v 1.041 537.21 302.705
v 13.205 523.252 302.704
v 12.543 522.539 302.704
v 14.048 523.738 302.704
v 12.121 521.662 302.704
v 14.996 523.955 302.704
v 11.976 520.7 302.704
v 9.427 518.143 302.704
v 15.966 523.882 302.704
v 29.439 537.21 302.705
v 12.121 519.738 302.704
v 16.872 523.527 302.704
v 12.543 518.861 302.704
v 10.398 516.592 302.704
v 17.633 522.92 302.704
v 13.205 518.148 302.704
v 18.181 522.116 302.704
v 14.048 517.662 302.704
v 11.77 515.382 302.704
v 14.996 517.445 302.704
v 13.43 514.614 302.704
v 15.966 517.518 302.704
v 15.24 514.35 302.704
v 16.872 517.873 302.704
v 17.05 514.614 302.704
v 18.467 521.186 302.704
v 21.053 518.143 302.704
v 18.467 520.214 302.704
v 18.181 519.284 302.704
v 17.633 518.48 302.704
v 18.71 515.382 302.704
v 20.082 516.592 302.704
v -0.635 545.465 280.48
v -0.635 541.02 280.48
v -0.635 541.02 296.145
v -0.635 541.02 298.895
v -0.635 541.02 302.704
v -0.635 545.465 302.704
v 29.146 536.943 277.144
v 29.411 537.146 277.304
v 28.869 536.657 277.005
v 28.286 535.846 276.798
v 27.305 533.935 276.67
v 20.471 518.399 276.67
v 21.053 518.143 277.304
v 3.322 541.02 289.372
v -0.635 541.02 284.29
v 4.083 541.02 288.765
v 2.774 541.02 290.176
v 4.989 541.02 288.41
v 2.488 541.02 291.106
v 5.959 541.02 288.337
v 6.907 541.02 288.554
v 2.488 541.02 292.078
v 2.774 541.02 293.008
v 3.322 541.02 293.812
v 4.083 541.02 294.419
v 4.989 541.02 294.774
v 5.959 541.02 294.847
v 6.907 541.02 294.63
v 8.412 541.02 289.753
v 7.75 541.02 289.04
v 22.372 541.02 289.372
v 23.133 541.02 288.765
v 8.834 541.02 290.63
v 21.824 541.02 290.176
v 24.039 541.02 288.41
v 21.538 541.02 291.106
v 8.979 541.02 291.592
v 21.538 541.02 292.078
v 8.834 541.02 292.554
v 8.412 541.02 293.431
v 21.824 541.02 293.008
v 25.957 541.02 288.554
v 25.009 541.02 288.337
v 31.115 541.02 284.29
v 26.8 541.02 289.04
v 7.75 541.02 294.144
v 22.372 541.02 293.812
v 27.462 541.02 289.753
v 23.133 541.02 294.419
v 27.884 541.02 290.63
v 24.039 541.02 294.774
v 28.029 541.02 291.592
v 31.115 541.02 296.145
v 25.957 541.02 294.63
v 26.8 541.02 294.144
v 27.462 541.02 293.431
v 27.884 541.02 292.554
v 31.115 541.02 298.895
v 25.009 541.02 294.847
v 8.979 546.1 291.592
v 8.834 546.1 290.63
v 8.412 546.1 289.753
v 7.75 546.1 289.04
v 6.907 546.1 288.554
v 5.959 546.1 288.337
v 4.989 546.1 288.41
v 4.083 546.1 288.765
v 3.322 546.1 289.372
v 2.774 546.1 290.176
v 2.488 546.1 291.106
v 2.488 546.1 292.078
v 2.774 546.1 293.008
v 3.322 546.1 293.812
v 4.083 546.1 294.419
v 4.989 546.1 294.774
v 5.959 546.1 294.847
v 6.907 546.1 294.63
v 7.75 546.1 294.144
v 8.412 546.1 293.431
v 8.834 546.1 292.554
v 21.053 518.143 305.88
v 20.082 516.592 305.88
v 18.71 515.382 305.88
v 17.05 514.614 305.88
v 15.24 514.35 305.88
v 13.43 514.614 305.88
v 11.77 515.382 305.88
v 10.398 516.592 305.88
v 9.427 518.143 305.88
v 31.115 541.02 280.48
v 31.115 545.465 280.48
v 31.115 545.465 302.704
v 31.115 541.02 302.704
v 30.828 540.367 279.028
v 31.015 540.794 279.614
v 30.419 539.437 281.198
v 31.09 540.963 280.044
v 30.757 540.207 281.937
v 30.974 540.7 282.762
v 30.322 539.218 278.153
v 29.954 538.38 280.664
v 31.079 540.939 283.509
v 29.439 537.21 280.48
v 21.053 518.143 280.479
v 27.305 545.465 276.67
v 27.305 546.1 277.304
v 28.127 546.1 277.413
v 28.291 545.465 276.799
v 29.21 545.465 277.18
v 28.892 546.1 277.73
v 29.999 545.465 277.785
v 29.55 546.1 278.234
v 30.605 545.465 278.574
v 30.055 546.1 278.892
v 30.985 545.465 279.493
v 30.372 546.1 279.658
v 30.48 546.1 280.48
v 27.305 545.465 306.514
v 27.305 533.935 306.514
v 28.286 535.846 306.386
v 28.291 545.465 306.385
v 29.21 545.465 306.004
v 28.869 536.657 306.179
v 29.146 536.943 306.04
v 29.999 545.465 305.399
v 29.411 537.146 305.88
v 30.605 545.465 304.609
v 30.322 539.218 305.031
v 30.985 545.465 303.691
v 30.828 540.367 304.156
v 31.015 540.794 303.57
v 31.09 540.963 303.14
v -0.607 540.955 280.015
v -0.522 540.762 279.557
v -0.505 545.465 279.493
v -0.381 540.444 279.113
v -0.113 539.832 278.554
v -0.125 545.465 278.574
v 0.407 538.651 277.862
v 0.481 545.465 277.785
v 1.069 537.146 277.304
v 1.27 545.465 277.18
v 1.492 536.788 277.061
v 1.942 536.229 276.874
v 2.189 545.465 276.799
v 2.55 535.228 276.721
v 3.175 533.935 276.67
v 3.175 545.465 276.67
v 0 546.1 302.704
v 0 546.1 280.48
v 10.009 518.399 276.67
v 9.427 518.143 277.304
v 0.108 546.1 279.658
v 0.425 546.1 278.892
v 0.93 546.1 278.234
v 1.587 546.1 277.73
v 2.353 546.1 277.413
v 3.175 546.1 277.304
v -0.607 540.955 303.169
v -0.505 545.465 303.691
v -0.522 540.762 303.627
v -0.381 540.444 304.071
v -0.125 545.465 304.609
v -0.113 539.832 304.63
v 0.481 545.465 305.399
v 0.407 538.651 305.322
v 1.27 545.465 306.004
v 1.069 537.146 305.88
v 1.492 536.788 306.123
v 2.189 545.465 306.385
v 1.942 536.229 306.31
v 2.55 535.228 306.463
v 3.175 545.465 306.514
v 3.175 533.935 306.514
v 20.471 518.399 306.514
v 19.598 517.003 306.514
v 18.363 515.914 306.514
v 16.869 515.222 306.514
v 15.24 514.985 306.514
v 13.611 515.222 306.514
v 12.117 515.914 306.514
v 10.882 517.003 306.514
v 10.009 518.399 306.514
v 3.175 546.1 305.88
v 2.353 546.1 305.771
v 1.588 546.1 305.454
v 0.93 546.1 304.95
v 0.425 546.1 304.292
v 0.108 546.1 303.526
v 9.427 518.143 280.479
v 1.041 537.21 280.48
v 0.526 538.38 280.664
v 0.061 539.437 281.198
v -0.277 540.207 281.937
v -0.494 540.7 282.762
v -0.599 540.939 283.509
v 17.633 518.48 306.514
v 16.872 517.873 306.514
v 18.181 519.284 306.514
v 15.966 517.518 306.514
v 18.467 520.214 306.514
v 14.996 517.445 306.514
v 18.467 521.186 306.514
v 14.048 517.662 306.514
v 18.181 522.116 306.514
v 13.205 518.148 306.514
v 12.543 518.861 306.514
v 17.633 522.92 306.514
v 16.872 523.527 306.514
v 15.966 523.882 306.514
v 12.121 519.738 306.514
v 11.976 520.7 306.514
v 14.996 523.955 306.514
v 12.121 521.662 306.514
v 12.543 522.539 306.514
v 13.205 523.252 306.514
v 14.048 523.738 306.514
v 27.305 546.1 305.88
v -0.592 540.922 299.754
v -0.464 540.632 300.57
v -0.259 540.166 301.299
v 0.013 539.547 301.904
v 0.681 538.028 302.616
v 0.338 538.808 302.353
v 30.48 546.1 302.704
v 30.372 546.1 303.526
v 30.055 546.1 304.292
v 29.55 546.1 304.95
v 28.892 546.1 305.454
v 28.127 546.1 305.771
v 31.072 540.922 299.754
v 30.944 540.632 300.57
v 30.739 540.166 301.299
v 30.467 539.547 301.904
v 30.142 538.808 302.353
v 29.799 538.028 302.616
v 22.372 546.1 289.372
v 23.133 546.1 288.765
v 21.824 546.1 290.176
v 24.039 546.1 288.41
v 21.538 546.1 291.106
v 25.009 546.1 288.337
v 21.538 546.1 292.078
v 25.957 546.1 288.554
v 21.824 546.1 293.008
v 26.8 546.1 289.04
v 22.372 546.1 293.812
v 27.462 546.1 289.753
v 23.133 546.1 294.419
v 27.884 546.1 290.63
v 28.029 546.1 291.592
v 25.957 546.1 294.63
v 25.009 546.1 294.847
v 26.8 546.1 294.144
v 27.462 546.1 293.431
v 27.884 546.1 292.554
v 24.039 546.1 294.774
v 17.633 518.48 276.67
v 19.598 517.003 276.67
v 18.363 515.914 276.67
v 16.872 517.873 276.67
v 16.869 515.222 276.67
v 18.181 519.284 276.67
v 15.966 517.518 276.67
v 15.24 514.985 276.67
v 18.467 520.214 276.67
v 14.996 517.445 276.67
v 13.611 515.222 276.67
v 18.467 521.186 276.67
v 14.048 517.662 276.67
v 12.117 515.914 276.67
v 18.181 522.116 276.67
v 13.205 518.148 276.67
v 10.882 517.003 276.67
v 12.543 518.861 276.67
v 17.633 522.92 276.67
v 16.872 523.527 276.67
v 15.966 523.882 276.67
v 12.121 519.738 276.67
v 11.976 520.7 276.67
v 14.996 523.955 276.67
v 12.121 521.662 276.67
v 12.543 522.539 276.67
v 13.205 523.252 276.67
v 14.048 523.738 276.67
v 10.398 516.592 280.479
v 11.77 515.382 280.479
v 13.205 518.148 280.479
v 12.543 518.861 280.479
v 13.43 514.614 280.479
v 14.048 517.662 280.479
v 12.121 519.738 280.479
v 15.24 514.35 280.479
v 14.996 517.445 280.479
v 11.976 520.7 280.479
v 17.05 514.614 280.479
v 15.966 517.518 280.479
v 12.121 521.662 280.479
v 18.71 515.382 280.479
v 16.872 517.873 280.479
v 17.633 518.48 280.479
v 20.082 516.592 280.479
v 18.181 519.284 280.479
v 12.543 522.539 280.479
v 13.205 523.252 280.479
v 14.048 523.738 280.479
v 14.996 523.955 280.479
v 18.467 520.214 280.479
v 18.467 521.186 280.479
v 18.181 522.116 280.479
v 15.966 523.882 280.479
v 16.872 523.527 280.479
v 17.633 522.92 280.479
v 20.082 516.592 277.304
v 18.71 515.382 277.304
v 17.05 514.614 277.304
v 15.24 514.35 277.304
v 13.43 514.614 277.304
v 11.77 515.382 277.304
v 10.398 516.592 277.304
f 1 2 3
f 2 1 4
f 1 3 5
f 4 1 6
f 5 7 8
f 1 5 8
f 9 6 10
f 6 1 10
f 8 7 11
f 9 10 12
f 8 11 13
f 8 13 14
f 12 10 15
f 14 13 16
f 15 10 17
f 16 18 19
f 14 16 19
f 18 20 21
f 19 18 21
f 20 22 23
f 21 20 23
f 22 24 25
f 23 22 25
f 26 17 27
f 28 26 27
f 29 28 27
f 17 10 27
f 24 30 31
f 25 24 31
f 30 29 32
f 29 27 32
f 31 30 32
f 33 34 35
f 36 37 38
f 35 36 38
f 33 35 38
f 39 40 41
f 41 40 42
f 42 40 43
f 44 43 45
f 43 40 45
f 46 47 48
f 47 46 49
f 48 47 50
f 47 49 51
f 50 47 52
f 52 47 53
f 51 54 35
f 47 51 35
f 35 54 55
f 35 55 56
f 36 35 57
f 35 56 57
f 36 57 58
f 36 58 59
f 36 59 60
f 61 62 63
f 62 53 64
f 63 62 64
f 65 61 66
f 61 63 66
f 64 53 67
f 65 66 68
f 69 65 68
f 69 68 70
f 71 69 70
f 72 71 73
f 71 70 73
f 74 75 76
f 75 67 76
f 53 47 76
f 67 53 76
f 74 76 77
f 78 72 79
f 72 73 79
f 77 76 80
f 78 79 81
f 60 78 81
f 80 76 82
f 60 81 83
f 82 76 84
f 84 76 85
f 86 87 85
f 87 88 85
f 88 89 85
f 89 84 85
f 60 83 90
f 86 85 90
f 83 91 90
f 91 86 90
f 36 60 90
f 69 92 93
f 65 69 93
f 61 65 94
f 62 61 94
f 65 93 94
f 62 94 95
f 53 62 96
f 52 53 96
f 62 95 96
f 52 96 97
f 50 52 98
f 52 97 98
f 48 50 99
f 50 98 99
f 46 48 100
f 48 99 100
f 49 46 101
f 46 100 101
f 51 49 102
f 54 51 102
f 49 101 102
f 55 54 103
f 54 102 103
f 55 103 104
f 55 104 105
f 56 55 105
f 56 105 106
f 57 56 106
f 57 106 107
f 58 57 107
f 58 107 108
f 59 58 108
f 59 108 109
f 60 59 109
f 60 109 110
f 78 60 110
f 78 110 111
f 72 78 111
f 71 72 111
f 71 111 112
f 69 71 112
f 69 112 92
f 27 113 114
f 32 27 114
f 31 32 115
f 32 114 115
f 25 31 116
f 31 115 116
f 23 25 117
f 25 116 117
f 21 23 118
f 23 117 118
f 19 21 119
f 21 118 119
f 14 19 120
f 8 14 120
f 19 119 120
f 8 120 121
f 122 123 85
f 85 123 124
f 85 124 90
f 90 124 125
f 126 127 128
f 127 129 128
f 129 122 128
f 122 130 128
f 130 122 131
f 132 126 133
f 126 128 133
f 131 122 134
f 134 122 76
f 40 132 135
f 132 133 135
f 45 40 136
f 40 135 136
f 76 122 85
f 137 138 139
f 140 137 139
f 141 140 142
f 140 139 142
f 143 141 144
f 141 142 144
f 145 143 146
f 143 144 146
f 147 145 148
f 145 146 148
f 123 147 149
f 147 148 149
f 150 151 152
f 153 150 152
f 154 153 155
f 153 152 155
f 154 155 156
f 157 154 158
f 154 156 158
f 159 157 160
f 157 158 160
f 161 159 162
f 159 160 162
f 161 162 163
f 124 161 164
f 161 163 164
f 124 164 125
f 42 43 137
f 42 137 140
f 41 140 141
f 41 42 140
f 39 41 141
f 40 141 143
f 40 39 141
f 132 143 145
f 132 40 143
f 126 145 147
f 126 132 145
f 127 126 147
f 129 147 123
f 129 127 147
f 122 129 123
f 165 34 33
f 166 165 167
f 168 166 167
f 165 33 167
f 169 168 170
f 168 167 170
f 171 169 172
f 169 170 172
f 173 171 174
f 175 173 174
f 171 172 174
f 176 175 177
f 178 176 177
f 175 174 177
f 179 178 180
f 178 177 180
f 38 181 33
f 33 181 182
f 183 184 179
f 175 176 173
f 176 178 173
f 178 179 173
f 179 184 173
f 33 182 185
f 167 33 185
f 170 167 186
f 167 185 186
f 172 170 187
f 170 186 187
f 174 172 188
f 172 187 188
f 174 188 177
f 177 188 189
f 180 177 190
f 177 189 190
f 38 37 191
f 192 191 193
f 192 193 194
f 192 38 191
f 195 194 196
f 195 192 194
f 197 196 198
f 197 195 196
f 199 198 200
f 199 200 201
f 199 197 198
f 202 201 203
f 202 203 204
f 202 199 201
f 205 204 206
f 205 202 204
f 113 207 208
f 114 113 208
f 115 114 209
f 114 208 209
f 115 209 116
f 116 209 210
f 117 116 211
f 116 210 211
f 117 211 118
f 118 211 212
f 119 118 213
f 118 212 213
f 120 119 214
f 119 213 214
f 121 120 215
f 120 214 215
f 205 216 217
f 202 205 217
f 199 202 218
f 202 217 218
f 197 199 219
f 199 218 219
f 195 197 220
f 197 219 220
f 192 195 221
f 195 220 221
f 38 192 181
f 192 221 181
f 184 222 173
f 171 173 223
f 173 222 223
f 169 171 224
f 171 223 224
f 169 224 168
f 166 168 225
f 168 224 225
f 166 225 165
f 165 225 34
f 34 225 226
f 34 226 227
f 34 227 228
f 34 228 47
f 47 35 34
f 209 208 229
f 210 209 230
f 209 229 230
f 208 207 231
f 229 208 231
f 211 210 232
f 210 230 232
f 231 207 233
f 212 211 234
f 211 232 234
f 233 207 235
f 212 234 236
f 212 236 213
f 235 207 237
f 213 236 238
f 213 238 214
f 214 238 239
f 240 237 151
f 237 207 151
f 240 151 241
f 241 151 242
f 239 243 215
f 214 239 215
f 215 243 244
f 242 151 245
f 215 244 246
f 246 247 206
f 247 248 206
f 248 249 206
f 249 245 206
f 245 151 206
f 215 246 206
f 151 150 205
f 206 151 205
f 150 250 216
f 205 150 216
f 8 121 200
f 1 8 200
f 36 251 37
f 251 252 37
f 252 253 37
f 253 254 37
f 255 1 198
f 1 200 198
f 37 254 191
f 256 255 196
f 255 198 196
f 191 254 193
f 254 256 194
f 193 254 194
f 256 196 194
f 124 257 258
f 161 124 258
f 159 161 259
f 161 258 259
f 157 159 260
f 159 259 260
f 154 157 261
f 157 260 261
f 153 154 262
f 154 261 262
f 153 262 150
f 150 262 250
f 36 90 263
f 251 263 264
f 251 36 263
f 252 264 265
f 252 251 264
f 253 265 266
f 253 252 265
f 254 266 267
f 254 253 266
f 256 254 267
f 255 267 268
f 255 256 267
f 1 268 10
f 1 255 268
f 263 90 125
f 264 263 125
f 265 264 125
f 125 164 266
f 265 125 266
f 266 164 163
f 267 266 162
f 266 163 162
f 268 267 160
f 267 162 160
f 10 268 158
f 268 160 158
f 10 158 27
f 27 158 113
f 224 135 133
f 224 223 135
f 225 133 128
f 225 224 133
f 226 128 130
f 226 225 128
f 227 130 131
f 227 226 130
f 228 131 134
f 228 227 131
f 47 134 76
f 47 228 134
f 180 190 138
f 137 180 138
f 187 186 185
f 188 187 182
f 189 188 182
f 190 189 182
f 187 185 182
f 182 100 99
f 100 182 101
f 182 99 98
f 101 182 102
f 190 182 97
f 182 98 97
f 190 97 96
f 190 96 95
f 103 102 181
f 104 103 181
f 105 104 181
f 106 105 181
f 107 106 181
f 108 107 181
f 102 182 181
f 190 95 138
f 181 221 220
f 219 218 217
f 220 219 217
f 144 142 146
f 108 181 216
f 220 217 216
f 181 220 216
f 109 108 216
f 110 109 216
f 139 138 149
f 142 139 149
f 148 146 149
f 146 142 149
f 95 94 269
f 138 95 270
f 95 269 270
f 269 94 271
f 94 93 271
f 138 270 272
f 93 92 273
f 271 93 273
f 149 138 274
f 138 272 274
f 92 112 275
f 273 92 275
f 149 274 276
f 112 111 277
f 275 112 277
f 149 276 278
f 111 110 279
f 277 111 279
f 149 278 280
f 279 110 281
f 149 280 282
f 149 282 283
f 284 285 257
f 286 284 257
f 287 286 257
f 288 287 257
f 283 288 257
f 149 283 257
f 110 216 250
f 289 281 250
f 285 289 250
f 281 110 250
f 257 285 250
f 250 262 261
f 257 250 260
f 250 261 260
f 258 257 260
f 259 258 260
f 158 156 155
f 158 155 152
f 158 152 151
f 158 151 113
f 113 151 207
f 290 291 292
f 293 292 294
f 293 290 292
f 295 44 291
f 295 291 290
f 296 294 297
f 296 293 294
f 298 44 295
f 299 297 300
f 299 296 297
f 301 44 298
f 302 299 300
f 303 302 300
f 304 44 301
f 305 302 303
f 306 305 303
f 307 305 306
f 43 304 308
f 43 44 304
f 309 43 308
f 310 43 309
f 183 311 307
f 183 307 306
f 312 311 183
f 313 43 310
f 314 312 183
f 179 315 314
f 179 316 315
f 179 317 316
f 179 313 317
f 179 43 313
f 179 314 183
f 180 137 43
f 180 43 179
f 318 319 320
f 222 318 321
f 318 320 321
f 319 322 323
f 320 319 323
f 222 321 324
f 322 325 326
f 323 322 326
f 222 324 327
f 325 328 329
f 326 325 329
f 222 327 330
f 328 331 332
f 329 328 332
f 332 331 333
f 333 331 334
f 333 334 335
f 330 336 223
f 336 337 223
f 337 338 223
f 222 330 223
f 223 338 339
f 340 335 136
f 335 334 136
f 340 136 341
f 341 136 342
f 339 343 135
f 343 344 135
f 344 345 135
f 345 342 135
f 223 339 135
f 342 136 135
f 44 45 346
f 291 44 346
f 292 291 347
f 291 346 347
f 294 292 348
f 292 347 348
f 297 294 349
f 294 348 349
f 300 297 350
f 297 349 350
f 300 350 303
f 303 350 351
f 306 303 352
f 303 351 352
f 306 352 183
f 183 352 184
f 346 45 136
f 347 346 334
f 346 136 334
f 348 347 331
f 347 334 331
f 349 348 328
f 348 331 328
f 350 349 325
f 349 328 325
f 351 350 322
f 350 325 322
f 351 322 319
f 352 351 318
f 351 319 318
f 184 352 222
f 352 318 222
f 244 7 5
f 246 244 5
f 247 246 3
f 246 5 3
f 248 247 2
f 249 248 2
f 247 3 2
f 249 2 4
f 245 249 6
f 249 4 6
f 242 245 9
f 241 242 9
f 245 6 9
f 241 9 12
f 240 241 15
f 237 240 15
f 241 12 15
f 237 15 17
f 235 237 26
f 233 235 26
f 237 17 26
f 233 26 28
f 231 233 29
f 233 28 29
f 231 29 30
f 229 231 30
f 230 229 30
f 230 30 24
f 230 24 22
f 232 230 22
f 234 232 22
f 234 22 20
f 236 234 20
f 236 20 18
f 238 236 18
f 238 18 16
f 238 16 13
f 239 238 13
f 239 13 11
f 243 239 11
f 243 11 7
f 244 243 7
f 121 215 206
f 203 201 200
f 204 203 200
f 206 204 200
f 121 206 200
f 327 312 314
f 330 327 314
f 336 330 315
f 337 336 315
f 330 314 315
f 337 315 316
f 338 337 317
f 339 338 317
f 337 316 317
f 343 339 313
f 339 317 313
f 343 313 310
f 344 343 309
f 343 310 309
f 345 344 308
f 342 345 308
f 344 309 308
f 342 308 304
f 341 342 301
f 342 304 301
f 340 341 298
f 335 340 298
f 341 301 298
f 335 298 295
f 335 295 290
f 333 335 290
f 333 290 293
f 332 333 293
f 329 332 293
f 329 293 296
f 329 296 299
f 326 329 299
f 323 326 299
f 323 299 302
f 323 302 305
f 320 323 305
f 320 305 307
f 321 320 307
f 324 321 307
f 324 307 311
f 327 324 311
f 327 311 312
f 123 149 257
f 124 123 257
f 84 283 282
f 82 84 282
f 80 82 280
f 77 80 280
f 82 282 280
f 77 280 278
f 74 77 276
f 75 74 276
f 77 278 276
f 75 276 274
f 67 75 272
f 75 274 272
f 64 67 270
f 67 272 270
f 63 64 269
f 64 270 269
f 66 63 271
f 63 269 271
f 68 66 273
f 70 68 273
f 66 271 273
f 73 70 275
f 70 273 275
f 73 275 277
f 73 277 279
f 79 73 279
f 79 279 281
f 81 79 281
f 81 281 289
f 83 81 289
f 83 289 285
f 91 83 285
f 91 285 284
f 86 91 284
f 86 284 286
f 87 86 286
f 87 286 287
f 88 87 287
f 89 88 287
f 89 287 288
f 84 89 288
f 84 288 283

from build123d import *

# Parameters (mm, degrees)
BULK_TRIANGLE_DEPTH      = 14.9225
BULK_TRIANGLE_DEPTH_BACK = 14.9225
U_CUTOUT_DEPTH           = 627.44103
U_CUTOUT_DEPTH_BACK      = 627.44103
F_1_4_CLEARANCE_HOLE1_D  = 6.5278
F_1_4_CLEARANCE_HOLE2_D  = 6.5278
INNER_FILLET_R           = 3.81
TRIANGLE_DEBURR_SIZE     = 0.635
OUTER_FILLET_R           = 3.81
CLAMP_FACE_DEBURR_SIZE   = 0.635


with BuildPart() as part:
    # Sketch1 → Bulk Triangle (new, two sides)
    with BuildSketch(Plane.XY.offset(291.592)) as bulk_triangle_sk:
        with BuildLine():
            Line((9.42744, 518.143313), (-0.635, 541.02))
            Line((-0.635, 541.02), (-0.635, 546.1))
            Line((-0.635, 546.1), (31.115, 546.1))
            Line((31.115, 546.1), (31.115, 541.02))
            Line((31.115, 541.02), (21.05256, 518.143313))
            ThreePointArc((21.05256, 518.143313), (15.24, 514.35), (9.42744, 518.143313))
        make_face()
    extrude(amount=BULK_TRIANGLE_DEPTH)
    extrude(bulk_triangle_sk.sketch, amount=-BULK_TRIANGLE_DEPTH_BACK)

    # Sketch3 → U-Cutout (cut, two sides)
    with BuildSketch(Plane(origin=(15.24, 0, 0), x_dir=(0, -4.31797119152115e-05, -0.9999999990677564), z_dir=(1, 0, 0))) as u_cutout_sk:
        Polygon((-302.727861, 541.006929), (-302.726709, 514.336929), (-280.501709, 514.337888), (-280.502861, 541.007888), align=None)
    extrude(amount=U_CUTOUT_DEPTH, mode=Mode.SUBTRACT)
    extrude(u_cutout_sk.sketch, amount=-U_CUTOUT_DEPTH_BACK, mode=Mode.SUBTRACT)

    # 1/4 Clearance Hole1 (through all)
    with Locations(Plane(origin=(15.24, 520.7, 306.5145), x_dir=(1, 0, 0), z_dir=(0, 0, 1))):
        with Locations((0, 0)):
            Hole(F_1_4_CLEARANCE_HOLE1_D / 2)

    # 1/4 Clearance Hole2 (through all)
    with Locations(Plane(origin=(24.765, 541.02, 291.592), x_dir=(-1, 0, 0), z_dir=(0, -1, 0))):
        with Locations((0, 0), (19.05, 0)):
            Hole(F_1_4_CLEARANCE_HOLE2_D / 2)

    # Inner Fillet
    inner_fillet_edges = [part.edges().sort_by_distance(p)[0] for p in [
        (15.24, 541.02, 280.4795),
        (15.24, 541.02, 302.7045),
    ]]
    fillet(inner_fillet_edges, radius=INNER_FILLET_R)

    # Triangle Deburr
    triangle_deburr_edges = [part.edges().sort_by_distance(p)[0] for p in [
        (15.24, 514.35, 276.6695),
        (4.39622, 529.581656, 276.6695),
        (26.08378, 529.581656, 276.6695),
        (4.39622, 529.581656, 306.5145),
        (15.24, 514.35, 306.5145),
        (26.08378, 529.581656, 306.5145),
    ]]
    chamfer(triangle_deburr_edges, length=TRIANGLE_DEBURR_SIZE)

    # Outer Fillet
    outer_fillet_edges = [part.edges().sort_by_distance(p)[0] for p in [
        (-0.635, 544.348569, 276.6695),
        (31.115, 544.348569, 276.6695),
        (-0.635, 544.348569, 306.5145),
        (31.115, 544.348569, 306.5145),
    ]]
    fillet(outer_fillet_edges, radius=OUTER_FILLET_R)

    # Clamp Face Deburr
    clamp_face_deburr_edges = [part.edges().sort_by_distance(p)[0] for p in [
        (-0.635, 546.1, 291.592),
        (15.24, 546.1, 276.6695),
        (31.115, 546.1, 291.592),
        (15.24, 546.1, 306.5145),
        (29.999077, 546.1, 305.398577),
        (0.480923, 546.1, 305.398577),
        (29.999077, 546.1, 277.785423),
        (0.480923, 546.1, 277.785423),
    ]]
    chamfer(clamp_face_deburr_edges, length=CLAMP_FACE_DEBURR_SIZE)


solid = part.part
